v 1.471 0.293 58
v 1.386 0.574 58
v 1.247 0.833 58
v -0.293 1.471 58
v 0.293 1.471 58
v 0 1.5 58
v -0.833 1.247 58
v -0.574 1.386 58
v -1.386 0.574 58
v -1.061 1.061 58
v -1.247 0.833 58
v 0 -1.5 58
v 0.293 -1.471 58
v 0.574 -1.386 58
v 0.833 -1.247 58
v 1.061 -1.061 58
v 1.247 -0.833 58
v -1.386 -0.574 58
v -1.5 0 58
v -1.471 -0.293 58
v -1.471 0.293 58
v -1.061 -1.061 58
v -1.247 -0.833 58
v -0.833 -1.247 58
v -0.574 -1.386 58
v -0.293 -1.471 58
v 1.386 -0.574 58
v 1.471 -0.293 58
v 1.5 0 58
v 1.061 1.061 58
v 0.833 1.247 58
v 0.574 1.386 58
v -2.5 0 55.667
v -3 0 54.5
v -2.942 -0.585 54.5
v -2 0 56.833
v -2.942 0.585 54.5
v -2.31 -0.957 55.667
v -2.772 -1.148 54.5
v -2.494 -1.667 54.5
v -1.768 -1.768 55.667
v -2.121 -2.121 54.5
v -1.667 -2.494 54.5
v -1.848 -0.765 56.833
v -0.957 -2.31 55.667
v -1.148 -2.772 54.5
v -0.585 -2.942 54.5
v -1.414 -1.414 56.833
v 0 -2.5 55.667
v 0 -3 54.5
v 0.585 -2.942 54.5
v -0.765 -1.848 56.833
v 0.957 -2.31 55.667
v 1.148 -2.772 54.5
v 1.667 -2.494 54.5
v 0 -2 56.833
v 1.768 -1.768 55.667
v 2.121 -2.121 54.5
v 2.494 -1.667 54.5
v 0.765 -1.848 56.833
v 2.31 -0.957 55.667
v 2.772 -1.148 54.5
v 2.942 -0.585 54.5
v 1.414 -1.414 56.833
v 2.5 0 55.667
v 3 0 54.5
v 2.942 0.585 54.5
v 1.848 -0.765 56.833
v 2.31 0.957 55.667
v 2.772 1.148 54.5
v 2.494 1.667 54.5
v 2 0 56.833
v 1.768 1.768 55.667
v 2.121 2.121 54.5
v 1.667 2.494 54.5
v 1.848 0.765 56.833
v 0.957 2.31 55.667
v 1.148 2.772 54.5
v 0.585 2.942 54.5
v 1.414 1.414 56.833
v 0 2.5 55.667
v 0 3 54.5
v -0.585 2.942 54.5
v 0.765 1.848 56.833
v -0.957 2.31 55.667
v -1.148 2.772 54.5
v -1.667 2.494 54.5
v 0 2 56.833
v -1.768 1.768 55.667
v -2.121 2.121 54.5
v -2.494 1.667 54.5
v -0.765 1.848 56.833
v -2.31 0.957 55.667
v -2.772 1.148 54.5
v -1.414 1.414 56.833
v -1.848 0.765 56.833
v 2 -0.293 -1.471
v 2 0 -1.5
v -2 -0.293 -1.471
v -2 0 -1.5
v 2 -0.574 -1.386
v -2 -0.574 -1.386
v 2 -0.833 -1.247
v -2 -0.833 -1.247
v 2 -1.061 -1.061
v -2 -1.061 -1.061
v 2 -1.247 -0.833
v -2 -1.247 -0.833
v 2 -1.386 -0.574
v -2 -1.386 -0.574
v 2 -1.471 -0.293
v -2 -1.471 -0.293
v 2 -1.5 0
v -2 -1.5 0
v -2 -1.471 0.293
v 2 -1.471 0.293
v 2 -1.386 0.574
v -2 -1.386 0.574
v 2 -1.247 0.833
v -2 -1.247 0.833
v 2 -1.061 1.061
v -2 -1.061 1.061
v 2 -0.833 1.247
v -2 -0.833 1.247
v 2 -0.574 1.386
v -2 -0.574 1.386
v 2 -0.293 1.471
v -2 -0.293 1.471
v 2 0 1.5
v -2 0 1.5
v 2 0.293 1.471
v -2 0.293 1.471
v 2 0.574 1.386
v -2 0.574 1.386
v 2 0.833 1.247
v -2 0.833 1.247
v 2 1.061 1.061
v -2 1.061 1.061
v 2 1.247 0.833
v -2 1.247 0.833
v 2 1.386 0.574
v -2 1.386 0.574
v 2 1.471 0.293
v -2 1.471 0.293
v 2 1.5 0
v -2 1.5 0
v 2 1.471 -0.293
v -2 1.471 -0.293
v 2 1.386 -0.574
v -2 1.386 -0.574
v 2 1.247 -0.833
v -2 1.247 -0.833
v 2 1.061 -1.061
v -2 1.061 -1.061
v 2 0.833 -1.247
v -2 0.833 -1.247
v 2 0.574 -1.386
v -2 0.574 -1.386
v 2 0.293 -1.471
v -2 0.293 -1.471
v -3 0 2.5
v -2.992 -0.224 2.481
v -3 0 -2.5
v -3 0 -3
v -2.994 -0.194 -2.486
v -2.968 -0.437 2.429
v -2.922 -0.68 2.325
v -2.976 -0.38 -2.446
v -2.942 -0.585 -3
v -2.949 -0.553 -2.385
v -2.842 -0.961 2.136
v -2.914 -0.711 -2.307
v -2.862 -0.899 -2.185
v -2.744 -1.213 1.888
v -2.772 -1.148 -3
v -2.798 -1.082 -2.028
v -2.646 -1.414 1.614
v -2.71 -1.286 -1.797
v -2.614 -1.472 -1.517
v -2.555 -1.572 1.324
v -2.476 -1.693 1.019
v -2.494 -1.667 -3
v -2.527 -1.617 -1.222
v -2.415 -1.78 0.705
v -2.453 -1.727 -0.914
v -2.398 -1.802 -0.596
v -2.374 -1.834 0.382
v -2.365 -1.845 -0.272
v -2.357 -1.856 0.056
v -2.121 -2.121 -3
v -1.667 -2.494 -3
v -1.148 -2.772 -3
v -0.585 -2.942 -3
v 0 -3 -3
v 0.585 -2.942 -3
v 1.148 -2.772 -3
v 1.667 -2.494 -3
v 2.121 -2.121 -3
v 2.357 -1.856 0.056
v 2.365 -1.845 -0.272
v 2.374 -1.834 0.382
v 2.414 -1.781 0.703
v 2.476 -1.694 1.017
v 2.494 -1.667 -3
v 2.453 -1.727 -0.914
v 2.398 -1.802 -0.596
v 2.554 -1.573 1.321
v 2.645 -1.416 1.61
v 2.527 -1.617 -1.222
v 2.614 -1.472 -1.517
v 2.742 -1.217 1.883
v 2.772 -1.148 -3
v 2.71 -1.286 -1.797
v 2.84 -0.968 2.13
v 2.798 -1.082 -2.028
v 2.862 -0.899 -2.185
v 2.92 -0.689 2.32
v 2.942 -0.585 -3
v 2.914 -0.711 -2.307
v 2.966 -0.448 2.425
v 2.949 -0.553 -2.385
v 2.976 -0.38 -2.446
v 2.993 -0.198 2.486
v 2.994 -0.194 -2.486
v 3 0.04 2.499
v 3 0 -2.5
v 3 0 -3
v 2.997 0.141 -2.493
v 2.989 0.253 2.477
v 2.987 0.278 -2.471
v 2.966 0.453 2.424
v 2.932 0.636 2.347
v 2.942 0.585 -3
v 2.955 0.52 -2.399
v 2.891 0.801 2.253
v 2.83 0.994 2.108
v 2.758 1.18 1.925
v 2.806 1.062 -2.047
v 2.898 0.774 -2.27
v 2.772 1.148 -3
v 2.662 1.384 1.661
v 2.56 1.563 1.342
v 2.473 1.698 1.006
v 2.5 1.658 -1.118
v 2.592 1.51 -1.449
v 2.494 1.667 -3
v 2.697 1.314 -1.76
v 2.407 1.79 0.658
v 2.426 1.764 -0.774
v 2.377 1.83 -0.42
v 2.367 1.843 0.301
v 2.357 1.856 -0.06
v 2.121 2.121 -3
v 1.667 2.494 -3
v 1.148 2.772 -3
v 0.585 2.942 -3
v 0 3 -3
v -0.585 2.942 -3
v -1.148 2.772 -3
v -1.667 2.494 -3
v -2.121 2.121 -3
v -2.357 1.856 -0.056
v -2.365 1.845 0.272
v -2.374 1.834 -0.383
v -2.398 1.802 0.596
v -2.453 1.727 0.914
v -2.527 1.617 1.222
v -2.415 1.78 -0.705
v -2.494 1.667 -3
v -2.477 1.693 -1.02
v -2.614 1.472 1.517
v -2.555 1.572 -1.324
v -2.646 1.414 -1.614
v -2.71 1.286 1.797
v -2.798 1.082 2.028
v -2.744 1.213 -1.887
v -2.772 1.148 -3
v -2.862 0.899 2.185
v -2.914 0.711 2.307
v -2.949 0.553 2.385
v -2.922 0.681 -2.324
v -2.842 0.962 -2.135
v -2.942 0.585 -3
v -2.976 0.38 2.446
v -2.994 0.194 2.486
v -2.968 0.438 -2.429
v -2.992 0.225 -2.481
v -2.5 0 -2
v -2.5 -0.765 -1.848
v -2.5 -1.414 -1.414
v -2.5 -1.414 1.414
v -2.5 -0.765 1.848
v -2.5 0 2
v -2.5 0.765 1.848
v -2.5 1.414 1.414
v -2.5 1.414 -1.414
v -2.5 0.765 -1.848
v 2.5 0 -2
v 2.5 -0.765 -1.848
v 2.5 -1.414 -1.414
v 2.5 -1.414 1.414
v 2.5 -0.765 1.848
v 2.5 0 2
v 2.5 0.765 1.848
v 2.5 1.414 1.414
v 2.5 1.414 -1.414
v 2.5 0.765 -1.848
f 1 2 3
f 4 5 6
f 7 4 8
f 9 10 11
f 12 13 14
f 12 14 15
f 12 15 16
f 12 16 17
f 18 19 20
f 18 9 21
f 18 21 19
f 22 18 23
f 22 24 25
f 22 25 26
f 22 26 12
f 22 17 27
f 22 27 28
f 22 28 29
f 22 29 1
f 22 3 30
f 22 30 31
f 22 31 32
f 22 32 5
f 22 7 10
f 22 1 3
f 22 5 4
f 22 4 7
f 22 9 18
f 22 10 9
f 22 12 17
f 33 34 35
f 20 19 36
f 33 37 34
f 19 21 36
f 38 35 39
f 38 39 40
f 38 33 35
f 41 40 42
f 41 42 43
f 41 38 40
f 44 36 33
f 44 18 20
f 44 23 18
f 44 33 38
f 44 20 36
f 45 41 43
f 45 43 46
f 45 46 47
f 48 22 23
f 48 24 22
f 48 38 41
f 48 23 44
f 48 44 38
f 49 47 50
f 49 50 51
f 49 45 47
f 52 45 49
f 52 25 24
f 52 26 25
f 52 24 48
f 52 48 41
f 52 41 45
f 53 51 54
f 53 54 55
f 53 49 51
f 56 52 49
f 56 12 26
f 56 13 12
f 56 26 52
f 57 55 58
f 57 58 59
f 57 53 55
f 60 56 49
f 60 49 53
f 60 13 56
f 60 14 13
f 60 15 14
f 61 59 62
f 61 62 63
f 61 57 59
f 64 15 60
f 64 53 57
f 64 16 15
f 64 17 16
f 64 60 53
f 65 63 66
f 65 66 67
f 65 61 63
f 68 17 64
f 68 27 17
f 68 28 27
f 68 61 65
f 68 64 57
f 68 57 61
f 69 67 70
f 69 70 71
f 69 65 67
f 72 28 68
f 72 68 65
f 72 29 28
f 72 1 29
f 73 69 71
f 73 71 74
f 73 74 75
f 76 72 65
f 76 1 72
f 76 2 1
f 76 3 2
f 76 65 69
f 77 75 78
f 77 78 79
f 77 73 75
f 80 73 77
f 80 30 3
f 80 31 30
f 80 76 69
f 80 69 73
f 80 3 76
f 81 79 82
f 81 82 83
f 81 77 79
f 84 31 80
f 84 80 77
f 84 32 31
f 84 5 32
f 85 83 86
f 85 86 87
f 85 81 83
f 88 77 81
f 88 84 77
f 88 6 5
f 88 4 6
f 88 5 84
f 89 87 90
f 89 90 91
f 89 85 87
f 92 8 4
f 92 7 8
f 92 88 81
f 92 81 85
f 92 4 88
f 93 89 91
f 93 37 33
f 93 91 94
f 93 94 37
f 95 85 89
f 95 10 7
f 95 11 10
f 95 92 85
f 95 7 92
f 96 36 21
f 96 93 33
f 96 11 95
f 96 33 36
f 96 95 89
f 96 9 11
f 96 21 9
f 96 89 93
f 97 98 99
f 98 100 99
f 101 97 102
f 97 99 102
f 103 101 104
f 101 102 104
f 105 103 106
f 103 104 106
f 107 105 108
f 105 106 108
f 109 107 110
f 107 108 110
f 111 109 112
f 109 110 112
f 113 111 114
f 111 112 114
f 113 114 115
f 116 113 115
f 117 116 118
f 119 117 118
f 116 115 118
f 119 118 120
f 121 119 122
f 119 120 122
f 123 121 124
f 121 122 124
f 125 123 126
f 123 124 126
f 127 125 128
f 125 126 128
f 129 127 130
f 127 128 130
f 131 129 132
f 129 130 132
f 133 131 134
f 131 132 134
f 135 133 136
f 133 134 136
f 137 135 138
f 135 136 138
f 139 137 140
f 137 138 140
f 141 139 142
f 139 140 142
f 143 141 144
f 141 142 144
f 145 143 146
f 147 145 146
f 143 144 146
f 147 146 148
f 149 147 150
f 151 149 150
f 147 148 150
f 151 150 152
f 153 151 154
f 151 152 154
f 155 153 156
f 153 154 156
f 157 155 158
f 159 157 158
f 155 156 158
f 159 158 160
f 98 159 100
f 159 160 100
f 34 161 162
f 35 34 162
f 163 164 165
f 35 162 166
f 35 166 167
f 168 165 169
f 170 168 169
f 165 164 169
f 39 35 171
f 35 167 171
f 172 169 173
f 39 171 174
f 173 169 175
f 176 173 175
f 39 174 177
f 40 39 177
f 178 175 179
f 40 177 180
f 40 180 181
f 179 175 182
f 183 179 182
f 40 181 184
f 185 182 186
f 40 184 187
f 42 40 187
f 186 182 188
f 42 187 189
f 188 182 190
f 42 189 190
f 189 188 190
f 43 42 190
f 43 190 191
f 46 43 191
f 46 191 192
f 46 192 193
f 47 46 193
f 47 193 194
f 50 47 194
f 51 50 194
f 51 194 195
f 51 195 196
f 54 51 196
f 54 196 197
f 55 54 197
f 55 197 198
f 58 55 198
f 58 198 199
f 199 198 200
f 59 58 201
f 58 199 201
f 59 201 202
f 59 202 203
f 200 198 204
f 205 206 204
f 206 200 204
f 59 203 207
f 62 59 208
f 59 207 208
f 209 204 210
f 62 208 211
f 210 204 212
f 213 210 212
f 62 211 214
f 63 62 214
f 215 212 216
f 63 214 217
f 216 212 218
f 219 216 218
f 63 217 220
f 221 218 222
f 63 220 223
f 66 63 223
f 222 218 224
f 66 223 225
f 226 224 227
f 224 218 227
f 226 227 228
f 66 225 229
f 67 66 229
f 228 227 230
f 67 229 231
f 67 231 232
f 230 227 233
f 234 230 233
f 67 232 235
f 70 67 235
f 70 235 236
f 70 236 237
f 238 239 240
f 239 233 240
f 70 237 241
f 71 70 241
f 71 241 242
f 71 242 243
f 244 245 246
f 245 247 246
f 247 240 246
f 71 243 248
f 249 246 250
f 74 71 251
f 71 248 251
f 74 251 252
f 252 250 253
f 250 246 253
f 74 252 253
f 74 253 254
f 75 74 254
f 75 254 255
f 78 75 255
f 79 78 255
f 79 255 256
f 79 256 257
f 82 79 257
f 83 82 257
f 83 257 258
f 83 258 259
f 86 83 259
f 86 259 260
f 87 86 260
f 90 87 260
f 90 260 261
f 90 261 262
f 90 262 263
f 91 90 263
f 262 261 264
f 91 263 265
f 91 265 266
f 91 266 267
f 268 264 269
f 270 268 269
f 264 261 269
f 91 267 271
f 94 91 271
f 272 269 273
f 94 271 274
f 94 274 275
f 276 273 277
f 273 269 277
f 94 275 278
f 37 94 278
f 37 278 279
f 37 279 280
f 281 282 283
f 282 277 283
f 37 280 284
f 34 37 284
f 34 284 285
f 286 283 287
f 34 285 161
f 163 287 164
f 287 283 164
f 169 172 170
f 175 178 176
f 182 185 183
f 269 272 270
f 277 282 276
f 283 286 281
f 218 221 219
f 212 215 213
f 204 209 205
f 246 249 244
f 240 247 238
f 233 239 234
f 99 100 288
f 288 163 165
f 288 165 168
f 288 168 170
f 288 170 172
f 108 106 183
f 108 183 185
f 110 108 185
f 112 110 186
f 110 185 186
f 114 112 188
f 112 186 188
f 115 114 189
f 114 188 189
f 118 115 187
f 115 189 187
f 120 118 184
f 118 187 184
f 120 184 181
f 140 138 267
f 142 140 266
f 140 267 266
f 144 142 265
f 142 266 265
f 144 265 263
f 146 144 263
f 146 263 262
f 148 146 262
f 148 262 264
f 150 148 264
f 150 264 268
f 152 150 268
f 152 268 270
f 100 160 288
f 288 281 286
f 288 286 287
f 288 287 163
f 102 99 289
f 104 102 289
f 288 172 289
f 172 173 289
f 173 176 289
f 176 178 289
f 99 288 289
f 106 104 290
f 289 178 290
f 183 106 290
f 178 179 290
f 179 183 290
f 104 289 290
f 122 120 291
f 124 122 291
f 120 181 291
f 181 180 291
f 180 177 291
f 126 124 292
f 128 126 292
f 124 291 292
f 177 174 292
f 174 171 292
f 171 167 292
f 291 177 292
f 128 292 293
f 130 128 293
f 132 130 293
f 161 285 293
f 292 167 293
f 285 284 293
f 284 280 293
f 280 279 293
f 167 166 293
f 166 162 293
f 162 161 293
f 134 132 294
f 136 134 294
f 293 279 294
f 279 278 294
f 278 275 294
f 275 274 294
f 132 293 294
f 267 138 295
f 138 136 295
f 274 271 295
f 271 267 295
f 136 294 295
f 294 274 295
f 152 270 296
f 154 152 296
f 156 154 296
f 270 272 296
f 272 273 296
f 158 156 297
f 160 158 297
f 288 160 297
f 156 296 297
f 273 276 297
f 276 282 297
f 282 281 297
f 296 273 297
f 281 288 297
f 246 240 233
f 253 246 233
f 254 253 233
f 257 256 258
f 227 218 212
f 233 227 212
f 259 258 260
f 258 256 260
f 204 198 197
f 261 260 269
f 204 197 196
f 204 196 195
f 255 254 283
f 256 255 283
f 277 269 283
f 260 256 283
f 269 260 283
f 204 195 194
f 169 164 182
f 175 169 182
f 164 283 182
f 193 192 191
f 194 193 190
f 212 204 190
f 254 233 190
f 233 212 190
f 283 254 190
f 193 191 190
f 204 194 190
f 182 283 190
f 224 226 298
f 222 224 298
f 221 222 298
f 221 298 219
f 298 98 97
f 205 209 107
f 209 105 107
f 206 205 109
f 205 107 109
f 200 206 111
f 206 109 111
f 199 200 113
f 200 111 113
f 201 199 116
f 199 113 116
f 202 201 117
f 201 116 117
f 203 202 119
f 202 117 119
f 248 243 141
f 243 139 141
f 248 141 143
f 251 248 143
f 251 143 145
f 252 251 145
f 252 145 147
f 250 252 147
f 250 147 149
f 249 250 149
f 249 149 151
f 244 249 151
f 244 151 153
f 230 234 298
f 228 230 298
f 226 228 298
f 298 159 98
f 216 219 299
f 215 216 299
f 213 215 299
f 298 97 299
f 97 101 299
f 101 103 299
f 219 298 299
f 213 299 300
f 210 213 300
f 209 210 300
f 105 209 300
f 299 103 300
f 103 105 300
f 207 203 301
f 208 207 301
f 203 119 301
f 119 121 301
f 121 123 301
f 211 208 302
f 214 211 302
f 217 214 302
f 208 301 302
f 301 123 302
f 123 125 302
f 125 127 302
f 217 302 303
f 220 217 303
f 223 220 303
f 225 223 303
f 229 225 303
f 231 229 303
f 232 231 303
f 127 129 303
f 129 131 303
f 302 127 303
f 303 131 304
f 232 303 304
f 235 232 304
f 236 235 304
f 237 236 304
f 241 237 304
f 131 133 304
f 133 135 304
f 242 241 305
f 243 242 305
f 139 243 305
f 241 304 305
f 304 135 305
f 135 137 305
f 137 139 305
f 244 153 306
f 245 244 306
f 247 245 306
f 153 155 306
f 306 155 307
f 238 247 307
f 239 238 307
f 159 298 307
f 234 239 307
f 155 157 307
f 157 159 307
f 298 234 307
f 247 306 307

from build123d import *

# Parameters (mm, degrees)
BOSS_EXTRU_1_START = -3
ESQUISSE1_R        = 3
BOSS_EXTRU_1_DEPTH = 61
CHANFREIN1_SIZE    = 3.5
CHANFREIN1_SIZE2   = 1.5


with BuildPart() as part:
    # Esquisse1 → Boss.-Extru.1 (new body)
    with BuildSketch(Plane.XY.offset(BOSS_EXTRU_1_START)):
        with Locations(Location((0, 0, 0), (0, 0, 180))):
            Circle(ESQUISSE1_R)
    extrude(amount=BOSS_EXTRU_1_DEPTH)

    # Chanfrein1
    chanfrein1_edges = [part.edges().sort_by_distance(p)[0] for p in [
        (3, 0, 58),
    ]]
    chanfrein1_side = [part.faces().sort_by_distance(p)[0] for p in [
        (3, 0, 27.5),
    ]]
    chamfer(chanfrein1_edges, length=CHANFREIN1_SIZE, length2=CHANFREIN1_SIZE2, reference=chanfrein1_side[0])

    # Esquisse2 → Enlèvement de matière-Révolution1 (revolve, cut)
    with BuildSketch(Plane(origin=(0, 0, 0), x_dir=(1, 0, 0), z_dir=(0, 1, 0))):
        Polygon((-3, 0), (3, 0), (3, 2.5), (2, 1.5), (-2, 1.5), (-3, 2.5), align=None)
    revolve(axis=Axis((-3, 0, 0), (-1, 0, 0)), mode=Mode.SUBTRACT)


solid = part.part
